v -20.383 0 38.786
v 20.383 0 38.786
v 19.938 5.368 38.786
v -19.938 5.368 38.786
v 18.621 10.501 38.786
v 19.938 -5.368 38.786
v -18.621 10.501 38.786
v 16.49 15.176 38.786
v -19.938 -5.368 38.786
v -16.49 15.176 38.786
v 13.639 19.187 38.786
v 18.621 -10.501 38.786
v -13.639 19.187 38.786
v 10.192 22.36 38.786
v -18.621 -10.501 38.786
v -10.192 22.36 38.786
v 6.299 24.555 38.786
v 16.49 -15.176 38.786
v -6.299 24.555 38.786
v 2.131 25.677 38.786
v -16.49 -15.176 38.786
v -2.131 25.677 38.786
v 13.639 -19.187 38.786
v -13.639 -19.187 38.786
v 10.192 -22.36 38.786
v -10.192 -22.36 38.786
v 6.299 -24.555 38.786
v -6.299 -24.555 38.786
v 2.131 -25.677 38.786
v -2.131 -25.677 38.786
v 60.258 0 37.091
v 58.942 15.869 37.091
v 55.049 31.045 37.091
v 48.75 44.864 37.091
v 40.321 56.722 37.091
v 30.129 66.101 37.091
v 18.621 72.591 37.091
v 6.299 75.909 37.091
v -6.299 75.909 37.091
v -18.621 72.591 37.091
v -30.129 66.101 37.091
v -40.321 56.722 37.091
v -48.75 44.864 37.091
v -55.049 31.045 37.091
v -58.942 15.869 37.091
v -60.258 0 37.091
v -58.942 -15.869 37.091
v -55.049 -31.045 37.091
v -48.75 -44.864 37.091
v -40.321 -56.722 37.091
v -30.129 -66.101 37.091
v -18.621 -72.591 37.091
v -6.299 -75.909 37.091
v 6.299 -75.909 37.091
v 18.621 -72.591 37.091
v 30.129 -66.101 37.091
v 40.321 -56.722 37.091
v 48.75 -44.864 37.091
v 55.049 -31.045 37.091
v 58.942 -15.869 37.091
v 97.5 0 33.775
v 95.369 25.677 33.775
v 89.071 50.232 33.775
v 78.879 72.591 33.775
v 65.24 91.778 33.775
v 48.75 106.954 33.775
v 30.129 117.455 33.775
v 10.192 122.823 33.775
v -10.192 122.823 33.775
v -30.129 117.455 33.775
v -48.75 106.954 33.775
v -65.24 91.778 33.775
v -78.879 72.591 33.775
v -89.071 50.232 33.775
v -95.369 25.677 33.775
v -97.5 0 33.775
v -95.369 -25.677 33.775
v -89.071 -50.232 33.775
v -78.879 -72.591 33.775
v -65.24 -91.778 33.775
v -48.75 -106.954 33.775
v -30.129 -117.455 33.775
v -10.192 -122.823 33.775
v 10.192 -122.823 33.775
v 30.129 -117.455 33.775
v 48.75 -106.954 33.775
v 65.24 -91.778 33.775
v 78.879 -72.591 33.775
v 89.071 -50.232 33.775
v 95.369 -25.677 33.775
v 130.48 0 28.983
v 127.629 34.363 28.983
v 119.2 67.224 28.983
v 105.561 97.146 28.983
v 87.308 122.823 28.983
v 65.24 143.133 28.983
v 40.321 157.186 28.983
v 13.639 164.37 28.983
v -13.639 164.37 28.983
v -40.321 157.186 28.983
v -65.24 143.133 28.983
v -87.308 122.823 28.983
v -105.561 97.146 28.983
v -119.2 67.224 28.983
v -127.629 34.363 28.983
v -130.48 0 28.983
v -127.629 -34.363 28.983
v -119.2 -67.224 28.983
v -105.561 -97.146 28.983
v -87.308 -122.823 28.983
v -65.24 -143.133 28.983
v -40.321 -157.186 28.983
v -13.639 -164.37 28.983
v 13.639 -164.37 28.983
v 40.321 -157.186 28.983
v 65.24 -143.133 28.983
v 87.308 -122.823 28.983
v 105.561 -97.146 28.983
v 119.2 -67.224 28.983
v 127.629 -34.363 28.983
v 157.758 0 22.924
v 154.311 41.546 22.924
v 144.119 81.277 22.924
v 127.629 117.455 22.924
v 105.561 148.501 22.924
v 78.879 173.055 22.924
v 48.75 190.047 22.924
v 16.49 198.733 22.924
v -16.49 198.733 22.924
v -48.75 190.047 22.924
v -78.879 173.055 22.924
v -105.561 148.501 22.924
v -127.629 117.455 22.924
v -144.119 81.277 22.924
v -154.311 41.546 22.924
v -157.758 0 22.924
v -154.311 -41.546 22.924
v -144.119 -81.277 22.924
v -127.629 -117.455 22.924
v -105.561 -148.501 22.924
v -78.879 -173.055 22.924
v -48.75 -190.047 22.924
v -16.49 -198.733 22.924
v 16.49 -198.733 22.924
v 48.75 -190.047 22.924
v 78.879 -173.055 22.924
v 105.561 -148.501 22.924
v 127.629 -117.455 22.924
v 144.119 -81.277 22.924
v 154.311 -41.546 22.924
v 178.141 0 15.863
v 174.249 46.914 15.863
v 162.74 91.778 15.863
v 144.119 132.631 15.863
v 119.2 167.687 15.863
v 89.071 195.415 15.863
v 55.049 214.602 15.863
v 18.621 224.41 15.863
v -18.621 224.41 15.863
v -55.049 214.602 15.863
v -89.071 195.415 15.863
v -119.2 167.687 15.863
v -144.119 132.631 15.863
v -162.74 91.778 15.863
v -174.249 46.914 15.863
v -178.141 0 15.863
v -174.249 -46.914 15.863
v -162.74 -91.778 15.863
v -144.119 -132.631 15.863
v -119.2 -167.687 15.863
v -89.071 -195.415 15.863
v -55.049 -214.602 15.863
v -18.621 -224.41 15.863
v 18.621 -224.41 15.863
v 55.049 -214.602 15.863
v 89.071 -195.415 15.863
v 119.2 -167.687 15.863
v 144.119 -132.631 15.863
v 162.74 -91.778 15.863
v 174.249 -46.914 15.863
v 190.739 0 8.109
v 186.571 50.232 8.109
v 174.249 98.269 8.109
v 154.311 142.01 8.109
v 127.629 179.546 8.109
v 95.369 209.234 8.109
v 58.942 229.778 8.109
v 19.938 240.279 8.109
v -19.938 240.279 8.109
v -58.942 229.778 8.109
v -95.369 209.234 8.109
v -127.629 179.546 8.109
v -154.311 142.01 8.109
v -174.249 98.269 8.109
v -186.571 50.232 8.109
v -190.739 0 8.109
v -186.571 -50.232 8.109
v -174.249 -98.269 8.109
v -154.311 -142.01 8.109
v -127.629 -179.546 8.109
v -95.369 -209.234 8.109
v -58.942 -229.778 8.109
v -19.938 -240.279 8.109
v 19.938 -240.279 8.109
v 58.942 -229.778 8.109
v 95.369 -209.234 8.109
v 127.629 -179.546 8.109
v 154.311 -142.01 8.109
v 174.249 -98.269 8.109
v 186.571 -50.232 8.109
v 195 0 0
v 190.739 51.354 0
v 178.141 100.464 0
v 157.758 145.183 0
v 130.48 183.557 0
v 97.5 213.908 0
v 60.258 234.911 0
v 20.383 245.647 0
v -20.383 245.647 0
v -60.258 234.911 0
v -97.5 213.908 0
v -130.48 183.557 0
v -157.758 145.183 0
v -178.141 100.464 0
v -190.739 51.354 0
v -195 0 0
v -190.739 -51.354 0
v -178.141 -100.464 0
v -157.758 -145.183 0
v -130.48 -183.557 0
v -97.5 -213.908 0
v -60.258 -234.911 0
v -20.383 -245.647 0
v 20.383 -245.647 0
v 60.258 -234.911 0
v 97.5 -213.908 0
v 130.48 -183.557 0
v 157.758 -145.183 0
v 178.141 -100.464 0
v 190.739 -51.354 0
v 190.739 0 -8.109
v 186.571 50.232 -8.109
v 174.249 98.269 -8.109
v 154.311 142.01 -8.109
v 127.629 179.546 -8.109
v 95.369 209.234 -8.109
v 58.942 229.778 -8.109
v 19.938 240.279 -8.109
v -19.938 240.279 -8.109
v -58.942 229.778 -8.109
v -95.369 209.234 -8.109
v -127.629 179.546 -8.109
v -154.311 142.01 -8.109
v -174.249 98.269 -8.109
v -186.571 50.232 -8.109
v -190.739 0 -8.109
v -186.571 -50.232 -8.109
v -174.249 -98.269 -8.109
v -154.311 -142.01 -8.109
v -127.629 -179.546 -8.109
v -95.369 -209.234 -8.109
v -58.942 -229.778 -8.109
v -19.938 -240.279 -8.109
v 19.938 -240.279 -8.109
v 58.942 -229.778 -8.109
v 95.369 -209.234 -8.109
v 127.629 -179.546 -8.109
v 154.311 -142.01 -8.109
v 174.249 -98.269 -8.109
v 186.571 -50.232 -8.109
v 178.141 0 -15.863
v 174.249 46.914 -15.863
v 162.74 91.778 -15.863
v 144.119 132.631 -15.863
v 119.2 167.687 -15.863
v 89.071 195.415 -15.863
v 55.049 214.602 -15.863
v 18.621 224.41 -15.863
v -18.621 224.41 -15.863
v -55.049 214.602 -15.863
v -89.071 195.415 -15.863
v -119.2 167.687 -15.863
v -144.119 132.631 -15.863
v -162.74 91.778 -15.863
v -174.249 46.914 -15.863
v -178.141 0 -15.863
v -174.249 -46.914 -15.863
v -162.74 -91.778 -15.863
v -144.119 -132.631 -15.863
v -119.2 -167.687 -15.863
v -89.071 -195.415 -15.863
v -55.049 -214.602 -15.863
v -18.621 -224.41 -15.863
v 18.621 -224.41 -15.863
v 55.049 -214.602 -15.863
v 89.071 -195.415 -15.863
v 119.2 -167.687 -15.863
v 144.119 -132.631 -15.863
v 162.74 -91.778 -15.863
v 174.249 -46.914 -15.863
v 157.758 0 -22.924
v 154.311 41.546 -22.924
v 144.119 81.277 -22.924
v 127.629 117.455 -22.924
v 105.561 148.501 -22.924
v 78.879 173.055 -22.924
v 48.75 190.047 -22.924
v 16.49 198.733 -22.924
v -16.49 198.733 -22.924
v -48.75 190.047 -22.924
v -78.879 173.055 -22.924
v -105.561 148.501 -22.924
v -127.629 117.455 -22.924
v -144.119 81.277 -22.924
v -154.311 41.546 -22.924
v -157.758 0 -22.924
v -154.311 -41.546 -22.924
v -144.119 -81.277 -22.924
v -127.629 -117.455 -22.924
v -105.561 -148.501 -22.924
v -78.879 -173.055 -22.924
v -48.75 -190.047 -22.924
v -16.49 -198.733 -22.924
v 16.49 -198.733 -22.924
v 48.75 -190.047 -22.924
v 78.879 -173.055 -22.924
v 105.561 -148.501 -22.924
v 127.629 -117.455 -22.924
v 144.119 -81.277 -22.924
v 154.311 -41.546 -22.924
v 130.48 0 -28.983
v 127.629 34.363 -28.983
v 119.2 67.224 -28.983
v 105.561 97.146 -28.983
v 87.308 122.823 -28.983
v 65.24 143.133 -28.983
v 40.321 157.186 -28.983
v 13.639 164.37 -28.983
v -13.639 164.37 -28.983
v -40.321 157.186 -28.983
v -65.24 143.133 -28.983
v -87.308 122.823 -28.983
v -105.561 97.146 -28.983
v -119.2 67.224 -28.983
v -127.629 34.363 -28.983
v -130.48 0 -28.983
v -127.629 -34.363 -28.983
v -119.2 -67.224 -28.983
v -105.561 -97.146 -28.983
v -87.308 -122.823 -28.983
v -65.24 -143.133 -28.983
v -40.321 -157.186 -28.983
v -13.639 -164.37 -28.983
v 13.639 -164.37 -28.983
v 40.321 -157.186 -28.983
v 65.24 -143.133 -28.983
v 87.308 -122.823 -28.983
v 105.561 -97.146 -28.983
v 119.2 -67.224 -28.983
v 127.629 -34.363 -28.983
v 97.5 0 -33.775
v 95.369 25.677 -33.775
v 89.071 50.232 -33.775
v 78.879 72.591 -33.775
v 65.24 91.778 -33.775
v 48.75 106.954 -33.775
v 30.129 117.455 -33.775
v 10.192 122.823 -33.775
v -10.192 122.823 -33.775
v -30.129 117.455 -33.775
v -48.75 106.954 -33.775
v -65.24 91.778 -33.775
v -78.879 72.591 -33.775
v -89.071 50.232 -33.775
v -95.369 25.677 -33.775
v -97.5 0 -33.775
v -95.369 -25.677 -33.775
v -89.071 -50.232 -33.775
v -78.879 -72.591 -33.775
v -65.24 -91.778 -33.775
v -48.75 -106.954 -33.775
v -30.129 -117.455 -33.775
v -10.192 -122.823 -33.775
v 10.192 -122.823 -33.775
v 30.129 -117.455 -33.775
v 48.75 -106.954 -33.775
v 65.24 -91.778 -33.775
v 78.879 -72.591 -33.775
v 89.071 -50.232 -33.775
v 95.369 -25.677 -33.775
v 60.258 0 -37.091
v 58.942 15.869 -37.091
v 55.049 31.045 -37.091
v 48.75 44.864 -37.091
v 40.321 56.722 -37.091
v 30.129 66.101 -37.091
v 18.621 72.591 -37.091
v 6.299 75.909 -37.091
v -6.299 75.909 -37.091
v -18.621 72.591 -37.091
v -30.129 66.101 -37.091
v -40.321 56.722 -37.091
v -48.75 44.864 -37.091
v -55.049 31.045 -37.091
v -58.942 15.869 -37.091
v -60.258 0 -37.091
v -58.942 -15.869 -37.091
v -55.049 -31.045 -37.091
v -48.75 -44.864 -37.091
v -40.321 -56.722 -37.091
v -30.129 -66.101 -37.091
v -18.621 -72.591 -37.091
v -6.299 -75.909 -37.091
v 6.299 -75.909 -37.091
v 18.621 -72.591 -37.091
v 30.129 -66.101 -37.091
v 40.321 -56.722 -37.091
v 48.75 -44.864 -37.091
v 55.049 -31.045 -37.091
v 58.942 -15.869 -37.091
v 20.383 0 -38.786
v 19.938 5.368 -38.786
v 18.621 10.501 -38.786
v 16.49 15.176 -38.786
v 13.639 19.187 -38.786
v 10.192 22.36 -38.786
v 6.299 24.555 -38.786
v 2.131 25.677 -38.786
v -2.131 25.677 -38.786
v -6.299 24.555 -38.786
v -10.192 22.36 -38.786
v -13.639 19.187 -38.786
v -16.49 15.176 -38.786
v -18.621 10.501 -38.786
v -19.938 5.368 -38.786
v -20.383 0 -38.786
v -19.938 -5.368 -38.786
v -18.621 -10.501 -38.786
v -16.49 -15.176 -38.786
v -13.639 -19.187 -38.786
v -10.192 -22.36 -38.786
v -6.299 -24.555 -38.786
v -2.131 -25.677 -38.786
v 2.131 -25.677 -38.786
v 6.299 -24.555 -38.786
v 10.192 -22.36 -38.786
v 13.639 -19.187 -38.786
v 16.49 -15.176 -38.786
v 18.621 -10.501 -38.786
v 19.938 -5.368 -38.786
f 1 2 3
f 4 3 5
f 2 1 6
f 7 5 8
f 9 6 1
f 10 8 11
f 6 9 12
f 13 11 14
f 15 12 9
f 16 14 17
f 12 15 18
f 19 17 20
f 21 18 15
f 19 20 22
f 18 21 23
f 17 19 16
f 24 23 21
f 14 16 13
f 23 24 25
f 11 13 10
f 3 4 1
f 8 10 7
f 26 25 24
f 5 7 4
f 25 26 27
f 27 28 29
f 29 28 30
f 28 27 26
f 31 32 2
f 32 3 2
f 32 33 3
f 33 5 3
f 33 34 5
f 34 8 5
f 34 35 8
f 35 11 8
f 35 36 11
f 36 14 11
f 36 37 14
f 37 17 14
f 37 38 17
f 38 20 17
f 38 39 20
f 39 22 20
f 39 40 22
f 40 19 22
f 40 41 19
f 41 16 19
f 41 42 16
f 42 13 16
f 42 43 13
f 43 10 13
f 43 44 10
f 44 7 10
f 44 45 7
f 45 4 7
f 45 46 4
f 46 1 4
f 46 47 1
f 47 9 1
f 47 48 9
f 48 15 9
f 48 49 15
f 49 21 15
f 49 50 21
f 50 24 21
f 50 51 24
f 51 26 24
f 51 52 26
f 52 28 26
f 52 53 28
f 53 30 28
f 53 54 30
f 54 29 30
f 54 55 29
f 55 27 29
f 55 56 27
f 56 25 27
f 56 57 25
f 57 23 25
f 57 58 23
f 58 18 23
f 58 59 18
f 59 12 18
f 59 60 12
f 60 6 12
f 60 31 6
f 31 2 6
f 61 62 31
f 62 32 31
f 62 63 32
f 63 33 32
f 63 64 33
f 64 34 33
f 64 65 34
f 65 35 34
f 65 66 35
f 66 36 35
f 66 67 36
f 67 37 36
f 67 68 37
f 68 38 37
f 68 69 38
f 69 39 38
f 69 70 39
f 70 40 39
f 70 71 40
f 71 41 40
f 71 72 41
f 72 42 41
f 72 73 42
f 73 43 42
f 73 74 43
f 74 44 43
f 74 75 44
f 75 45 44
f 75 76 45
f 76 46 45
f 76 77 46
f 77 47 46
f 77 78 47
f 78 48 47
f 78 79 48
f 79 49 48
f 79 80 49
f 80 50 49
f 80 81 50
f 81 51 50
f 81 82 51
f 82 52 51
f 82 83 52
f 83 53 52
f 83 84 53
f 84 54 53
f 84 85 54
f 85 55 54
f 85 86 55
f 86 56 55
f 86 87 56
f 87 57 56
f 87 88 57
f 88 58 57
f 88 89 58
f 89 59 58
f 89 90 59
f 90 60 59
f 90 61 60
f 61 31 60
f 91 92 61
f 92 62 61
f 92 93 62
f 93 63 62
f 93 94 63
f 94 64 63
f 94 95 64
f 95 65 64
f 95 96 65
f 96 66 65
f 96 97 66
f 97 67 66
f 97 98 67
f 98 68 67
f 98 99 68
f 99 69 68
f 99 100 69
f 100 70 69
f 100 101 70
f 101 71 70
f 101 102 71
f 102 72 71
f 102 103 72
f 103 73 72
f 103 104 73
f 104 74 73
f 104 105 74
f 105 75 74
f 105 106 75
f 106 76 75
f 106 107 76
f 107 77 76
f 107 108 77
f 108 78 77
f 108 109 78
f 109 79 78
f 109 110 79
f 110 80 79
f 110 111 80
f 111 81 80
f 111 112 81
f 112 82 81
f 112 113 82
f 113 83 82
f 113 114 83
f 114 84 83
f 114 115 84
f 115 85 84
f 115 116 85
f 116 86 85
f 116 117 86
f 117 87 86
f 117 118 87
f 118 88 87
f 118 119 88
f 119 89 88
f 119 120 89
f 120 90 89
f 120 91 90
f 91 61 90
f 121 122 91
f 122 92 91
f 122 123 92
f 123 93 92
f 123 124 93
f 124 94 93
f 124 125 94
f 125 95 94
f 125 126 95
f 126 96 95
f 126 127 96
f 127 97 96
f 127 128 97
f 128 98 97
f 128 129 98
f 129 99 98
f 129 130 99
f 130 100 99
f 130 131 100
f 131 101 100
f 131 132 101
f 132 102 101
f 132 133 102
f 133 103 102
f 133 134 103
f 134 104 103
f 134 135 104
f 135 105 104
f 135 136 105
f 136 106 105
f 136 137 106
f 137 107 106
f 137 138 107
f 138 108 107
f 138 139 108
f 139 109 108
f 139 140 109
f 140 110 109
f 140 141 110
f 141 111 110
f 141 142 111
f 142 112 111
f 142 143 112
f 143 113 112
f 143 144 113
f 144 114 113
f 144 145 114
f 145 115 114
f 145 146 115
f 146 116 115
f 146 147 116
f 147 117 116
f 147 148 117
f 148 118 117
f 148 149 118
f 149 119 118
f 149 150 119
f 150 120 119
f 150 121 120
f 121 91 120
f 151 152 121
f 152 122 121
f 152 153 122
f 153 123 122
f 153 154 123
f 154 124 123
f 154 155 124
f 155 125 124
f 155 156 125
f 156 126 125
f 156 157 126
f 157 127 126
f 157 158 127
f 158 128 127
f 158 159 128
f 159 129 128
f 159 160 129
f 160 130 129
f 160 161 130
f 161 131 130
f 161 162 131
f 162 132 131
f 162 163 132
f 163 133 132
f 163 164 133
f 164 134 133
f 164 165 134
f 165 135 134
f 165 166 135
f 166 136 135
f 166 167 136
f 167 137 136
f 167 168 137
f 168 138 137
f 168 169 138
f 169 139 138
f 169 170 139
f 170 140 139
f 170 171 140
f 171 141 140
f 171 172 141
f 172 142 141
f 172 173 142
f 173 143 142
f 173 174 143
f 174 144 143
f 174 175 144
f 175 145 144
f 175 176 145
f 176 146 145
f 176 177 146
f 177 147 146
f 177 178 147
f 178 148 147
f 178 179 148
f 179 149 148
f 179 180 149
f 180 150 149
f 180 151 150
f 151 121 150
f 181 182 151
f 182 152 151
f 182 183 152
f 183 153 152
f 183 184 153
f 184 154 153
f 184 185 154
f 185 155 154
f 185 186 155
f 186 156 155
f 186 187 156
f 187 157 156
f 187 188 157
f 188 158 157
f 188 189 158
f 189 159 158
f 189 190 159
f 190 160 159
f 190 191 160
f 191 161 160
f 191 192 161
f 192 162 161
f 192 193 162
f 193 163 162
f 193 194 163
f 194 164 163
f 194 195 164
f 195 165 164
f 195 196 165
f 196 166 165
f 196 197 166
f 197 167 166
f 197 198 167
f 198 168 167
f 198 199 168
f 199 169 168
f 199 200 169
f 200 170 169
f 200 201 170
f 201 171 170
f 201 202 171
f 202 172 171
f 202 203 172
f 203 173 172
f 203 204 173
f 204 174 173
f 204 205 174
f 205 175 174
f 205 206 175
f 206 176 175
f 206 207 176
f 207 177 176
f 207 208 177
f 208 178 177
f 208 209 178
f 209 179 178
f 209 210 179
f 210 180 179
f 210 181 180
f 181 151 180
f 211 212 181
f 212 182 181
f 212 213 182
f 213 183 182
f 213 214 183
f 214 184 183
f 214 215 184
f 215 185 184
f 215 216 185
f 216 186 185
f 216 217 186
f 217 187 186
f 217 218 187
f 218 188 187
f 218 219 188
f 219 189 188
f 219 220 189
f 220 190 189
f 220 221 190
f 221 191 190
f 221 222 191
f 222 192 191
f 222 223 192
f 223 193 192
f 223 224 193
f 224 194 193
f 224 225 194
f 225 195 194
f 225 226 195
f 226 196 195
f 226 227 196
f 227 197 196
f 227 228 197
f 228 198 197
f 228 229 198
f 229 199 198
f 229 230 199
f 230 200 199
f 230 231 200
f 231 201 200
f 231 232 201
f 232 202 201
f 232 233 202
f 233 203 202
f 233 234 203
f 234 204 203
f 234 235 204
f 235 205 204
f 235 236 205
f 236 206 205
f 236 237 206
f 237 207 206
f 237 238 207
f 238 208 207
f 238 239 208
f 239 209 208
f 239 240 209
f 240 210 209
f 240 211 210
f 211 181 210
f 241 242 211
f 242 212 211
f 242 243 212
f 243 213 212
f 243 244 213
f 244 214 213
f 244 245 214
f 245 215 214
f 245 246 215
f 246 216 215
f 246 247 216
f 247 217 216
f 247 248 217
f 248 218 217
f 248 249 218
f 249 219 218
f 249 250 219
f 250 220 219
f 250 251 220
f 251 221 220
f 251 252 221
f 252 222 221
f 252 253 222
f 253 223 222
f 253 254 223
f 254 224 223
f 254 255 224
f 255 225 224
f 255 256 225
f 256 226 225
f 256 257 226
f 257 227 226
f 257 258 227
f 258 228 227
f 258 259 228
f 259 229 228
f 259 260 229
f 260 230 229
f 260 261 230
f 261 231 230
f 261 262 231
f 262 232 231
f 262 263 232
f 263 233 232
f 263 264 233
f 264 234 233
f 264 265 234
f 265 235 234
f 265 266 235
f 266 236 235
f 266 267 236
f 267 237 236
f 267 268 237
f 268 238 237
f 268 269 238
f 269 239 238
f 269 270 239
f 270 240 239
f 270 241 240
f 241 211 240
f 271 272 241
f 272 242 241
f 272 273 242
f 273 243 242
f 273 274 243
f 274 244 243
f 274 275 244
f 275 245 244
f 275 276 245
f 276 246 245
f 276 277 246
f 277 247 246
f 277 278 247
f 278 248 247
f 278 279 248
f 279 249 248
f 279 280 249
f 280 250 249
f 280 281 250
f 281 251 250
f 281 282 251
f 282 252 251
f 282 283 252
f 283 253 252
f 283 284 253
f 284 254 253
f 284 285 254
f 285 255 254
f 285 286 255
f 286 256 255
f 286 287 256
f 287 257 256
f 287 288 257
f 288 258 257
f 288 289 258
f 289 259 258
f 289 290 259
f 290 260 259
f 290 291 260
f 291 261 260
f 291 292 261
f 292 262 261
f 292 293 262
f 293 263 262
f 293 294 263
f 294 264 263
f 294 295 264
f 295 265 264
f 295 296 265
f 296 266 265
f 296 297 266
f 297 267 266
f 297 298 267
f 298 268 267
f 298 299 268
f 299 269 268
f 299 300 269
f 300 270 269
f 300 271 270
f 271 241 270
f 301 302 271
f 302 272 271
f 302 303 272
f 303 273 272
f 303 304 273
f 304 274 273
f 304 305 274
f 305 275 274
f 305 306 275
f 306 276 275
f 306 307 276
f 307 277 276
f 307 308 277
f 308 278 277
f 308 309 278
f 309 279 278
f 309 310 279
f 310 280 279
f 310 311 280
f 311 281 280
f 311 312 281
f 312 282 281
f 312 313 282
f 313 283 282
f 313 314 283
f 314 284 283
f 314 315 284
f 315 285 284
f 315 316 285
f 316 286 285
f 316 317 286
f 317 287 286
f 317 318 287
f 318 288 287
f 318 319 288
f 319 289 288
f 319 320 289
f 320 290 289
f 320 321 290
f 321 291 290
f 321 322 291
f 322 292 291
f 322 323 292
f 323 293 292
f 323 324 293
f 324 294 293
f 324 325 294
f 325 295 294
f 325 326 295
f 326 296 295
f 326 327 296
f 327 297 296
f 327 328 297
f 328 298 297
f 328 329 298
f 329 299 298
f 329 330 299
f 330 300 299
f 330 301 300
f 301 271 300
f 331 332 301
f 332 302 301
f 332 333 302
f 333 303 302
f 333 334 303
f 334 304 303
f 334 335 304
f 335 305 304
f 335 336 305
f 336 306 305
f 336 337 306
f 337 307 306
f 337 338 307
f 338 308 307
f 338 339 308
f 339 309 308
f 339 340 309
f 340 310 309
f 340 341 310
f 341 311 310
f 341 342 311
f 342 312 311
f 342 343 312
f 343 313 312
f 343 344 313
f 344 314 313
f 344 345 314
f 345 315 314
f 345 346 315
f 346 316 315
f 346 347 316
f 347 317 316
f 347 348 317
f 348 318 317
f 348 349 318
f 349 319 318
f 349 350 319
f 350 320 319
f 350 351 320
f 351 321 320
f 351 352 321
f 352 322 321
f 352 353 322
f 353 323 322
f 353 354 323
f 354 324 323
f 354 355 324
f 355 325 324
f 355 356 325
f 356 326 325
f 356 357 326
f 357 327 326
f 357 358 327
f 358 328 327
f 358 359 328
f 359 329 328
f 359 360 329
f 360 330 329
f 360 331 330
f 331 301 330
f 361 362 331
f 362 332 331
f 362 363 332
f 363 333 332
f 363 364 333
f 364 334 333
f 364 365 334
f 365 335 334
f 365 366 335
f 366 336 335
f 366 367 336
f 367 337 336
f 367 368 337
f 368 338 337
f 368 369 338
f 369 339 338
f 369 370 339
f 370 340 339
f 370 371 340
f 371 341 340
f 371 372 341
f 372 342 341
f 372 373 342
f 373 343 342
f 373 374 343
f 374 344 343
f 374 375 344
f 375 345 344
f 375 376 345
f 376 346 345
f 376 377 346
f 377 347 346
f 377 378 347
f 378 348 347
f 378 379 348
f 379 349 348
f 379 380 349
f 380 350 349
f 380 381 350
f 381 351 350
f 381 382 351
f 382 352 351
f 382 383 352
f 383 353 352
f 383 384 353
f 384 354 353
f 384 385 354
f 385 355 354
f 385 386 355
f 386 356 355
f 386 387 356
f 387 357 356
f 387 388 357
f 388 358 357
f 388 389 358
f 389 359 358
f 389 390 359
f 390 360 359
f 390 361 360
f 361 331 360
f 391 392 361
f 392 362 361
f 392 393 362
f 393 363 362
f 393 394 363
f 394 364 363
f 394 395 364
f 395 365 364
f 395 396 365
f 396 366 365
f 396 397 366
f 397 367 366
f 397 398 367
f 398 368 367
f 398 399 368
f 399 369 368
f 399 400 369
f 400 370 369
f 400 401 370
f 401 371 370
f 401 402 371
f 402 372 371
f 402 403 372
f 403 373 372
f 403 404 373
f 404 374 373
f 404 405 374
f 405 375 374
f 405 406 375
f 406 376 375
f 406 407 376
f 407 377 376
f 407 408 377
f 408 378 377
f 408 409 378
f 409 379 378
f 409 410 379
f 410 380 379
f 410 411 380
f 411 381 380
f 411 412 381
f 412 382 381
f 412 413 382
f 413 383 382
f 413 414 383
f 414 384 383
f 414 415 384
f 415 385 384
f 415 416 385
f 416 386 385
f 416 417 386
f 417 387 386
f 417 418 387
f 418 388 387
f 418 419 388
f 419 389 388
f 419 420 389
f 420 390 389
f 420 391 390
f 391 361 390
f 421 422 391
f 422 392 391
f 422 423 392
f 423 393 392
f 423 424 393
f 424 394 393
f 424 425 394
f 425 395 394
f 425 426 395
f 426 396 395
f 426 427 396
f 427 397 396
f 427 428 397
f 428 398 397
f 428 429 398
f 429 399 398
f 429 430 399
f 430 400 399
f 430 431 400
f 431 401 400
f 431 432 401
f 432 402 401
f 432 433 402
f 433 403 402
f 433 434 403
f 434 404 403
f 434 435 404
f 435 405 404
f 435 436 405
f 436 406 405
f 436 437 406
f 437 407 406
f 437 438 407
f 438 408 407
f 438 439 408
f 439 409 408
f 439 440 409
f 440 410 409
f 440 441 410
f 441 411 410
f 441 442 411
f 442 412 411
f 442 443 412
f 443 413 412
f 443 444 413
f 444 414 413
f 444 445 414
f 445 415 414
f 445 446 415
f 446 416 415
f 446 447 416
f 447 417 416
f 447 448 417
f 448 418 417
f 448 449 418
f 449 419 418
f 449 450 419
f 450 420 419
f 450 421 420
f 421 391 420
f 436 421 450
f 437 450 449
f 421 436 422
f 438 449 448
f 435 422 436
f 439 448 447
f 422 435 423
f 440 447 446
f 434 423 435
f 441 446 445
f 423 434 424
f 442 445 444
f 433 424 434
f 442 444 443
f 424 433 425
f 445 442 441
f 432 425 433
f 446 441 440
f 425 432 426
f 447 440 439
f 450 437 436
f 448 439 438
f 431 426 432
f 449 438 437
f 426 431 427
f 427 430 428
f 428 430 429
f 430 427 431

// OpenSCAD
// Generated by SolidPython 1.0.1 on 2020-07-29 00:46:52


scale(v = [15, 19, 3]) {
	sphere(r = 13);
}
/***********************************************
*********      SolidPython code:      **********
************************************************
 
# import packages: SolidPython
from solid import *
from solid.utils import *
from itertools import chain, combinations, permutations


class Resize:

    def __init__(self, scad_file):
        self.scad_file = scad_file
        #self.scad_file = import_scad(scad_file)
        # cone/cylinder param:
        self.r1 = 0
        self.r2 = 0
        self.h = 0
        # rectangular prism param:
        self.w = 0
        self.l = 0
        # ellipse param:
        self.r = 0

    # import OpenScad code (file name corresponds to shape)


    # classify shape + parameters
    def assign(self, param1, param2, param3):
        if self.scad_file == 'cone.scad':
            self.r1 = param1
            self.r2 = param2
            self.h = param3
        elif self.scad_file == 'cylinder.scad':
            self.r1 = param1
            self.r2 = param2
            self.h = param3
        elif self.scad_file == 'rectangularPrism.scad':
            self.h = param1
            self.l = param2
            self.w = param3
        else:
            self.r = param1
            self.h = param2

    # resize parameters
    def iterate(self):
        x = range(3, 20, 2)
        i = 1
        if self.scad_file == 'cone.scad':
            tempList = list(permutations(x, 2))
            for temp in tempList:
                param1 = temp[0]
                param2 = temp[1]
                filepath = 'produced_scad_files/' + 'cone' + str(param1) + '_' + str(param2) + '_' + '.scad'
                scad_render_to_file(cylinder(h=param1, r1=param2, r2=0), filepath)

        elif self.scad_file == 'cylinder.scad':
            tempList = list(permutations(x, 3))
            for temp in tempList:
                param1 = temp[0]
                param2 = temp[1]
                filepath = 'produced_scad_files/' + 'cylinder' + str(param1) + '_' + str(param2) + '_' + '.scad'
                scad_render_to_file(cylinder(h=param1, r1=param2, r2=param2), filepath)

        elif self.scad_file == 'rectangularPrism.scad':
            tempList = list(permutations(x, 3))
            for temp in tempList:
                param1 = temp[0]
                param2 = temp[1]
                param3 = temp[2]
                filepath = 'produced_scad_files/' + 'rectangularPrism' + str(param1) + '_' + str(param2) + '_' + str(
                    param3) + '.scad'
                scad_render_to_file(cube(size=(param1, param2, param3)), filepath)

        elif self.scad_file == 'ellipse.scad':
            tempList = list(permutations(x, 4))
            for temp in tempList:
                param1 = temp[0]
                param2 = temp[1]
                param3 = temp[2]
                param4 = temp[3]
                filepath = 'produced_scad_files/' + 'ellipse' + str(param1) + '_' + str(param2) + '_' + str(param3) + '_' + str(param4) + '.scad'
                scad_render_to_file(scale([param1, param2, param3])(sphere(r=param4)), filepath)

    def render_to_scadfile(self):
        scad_render_to_file(scad, 'example.scad') 
 
************************************************/
